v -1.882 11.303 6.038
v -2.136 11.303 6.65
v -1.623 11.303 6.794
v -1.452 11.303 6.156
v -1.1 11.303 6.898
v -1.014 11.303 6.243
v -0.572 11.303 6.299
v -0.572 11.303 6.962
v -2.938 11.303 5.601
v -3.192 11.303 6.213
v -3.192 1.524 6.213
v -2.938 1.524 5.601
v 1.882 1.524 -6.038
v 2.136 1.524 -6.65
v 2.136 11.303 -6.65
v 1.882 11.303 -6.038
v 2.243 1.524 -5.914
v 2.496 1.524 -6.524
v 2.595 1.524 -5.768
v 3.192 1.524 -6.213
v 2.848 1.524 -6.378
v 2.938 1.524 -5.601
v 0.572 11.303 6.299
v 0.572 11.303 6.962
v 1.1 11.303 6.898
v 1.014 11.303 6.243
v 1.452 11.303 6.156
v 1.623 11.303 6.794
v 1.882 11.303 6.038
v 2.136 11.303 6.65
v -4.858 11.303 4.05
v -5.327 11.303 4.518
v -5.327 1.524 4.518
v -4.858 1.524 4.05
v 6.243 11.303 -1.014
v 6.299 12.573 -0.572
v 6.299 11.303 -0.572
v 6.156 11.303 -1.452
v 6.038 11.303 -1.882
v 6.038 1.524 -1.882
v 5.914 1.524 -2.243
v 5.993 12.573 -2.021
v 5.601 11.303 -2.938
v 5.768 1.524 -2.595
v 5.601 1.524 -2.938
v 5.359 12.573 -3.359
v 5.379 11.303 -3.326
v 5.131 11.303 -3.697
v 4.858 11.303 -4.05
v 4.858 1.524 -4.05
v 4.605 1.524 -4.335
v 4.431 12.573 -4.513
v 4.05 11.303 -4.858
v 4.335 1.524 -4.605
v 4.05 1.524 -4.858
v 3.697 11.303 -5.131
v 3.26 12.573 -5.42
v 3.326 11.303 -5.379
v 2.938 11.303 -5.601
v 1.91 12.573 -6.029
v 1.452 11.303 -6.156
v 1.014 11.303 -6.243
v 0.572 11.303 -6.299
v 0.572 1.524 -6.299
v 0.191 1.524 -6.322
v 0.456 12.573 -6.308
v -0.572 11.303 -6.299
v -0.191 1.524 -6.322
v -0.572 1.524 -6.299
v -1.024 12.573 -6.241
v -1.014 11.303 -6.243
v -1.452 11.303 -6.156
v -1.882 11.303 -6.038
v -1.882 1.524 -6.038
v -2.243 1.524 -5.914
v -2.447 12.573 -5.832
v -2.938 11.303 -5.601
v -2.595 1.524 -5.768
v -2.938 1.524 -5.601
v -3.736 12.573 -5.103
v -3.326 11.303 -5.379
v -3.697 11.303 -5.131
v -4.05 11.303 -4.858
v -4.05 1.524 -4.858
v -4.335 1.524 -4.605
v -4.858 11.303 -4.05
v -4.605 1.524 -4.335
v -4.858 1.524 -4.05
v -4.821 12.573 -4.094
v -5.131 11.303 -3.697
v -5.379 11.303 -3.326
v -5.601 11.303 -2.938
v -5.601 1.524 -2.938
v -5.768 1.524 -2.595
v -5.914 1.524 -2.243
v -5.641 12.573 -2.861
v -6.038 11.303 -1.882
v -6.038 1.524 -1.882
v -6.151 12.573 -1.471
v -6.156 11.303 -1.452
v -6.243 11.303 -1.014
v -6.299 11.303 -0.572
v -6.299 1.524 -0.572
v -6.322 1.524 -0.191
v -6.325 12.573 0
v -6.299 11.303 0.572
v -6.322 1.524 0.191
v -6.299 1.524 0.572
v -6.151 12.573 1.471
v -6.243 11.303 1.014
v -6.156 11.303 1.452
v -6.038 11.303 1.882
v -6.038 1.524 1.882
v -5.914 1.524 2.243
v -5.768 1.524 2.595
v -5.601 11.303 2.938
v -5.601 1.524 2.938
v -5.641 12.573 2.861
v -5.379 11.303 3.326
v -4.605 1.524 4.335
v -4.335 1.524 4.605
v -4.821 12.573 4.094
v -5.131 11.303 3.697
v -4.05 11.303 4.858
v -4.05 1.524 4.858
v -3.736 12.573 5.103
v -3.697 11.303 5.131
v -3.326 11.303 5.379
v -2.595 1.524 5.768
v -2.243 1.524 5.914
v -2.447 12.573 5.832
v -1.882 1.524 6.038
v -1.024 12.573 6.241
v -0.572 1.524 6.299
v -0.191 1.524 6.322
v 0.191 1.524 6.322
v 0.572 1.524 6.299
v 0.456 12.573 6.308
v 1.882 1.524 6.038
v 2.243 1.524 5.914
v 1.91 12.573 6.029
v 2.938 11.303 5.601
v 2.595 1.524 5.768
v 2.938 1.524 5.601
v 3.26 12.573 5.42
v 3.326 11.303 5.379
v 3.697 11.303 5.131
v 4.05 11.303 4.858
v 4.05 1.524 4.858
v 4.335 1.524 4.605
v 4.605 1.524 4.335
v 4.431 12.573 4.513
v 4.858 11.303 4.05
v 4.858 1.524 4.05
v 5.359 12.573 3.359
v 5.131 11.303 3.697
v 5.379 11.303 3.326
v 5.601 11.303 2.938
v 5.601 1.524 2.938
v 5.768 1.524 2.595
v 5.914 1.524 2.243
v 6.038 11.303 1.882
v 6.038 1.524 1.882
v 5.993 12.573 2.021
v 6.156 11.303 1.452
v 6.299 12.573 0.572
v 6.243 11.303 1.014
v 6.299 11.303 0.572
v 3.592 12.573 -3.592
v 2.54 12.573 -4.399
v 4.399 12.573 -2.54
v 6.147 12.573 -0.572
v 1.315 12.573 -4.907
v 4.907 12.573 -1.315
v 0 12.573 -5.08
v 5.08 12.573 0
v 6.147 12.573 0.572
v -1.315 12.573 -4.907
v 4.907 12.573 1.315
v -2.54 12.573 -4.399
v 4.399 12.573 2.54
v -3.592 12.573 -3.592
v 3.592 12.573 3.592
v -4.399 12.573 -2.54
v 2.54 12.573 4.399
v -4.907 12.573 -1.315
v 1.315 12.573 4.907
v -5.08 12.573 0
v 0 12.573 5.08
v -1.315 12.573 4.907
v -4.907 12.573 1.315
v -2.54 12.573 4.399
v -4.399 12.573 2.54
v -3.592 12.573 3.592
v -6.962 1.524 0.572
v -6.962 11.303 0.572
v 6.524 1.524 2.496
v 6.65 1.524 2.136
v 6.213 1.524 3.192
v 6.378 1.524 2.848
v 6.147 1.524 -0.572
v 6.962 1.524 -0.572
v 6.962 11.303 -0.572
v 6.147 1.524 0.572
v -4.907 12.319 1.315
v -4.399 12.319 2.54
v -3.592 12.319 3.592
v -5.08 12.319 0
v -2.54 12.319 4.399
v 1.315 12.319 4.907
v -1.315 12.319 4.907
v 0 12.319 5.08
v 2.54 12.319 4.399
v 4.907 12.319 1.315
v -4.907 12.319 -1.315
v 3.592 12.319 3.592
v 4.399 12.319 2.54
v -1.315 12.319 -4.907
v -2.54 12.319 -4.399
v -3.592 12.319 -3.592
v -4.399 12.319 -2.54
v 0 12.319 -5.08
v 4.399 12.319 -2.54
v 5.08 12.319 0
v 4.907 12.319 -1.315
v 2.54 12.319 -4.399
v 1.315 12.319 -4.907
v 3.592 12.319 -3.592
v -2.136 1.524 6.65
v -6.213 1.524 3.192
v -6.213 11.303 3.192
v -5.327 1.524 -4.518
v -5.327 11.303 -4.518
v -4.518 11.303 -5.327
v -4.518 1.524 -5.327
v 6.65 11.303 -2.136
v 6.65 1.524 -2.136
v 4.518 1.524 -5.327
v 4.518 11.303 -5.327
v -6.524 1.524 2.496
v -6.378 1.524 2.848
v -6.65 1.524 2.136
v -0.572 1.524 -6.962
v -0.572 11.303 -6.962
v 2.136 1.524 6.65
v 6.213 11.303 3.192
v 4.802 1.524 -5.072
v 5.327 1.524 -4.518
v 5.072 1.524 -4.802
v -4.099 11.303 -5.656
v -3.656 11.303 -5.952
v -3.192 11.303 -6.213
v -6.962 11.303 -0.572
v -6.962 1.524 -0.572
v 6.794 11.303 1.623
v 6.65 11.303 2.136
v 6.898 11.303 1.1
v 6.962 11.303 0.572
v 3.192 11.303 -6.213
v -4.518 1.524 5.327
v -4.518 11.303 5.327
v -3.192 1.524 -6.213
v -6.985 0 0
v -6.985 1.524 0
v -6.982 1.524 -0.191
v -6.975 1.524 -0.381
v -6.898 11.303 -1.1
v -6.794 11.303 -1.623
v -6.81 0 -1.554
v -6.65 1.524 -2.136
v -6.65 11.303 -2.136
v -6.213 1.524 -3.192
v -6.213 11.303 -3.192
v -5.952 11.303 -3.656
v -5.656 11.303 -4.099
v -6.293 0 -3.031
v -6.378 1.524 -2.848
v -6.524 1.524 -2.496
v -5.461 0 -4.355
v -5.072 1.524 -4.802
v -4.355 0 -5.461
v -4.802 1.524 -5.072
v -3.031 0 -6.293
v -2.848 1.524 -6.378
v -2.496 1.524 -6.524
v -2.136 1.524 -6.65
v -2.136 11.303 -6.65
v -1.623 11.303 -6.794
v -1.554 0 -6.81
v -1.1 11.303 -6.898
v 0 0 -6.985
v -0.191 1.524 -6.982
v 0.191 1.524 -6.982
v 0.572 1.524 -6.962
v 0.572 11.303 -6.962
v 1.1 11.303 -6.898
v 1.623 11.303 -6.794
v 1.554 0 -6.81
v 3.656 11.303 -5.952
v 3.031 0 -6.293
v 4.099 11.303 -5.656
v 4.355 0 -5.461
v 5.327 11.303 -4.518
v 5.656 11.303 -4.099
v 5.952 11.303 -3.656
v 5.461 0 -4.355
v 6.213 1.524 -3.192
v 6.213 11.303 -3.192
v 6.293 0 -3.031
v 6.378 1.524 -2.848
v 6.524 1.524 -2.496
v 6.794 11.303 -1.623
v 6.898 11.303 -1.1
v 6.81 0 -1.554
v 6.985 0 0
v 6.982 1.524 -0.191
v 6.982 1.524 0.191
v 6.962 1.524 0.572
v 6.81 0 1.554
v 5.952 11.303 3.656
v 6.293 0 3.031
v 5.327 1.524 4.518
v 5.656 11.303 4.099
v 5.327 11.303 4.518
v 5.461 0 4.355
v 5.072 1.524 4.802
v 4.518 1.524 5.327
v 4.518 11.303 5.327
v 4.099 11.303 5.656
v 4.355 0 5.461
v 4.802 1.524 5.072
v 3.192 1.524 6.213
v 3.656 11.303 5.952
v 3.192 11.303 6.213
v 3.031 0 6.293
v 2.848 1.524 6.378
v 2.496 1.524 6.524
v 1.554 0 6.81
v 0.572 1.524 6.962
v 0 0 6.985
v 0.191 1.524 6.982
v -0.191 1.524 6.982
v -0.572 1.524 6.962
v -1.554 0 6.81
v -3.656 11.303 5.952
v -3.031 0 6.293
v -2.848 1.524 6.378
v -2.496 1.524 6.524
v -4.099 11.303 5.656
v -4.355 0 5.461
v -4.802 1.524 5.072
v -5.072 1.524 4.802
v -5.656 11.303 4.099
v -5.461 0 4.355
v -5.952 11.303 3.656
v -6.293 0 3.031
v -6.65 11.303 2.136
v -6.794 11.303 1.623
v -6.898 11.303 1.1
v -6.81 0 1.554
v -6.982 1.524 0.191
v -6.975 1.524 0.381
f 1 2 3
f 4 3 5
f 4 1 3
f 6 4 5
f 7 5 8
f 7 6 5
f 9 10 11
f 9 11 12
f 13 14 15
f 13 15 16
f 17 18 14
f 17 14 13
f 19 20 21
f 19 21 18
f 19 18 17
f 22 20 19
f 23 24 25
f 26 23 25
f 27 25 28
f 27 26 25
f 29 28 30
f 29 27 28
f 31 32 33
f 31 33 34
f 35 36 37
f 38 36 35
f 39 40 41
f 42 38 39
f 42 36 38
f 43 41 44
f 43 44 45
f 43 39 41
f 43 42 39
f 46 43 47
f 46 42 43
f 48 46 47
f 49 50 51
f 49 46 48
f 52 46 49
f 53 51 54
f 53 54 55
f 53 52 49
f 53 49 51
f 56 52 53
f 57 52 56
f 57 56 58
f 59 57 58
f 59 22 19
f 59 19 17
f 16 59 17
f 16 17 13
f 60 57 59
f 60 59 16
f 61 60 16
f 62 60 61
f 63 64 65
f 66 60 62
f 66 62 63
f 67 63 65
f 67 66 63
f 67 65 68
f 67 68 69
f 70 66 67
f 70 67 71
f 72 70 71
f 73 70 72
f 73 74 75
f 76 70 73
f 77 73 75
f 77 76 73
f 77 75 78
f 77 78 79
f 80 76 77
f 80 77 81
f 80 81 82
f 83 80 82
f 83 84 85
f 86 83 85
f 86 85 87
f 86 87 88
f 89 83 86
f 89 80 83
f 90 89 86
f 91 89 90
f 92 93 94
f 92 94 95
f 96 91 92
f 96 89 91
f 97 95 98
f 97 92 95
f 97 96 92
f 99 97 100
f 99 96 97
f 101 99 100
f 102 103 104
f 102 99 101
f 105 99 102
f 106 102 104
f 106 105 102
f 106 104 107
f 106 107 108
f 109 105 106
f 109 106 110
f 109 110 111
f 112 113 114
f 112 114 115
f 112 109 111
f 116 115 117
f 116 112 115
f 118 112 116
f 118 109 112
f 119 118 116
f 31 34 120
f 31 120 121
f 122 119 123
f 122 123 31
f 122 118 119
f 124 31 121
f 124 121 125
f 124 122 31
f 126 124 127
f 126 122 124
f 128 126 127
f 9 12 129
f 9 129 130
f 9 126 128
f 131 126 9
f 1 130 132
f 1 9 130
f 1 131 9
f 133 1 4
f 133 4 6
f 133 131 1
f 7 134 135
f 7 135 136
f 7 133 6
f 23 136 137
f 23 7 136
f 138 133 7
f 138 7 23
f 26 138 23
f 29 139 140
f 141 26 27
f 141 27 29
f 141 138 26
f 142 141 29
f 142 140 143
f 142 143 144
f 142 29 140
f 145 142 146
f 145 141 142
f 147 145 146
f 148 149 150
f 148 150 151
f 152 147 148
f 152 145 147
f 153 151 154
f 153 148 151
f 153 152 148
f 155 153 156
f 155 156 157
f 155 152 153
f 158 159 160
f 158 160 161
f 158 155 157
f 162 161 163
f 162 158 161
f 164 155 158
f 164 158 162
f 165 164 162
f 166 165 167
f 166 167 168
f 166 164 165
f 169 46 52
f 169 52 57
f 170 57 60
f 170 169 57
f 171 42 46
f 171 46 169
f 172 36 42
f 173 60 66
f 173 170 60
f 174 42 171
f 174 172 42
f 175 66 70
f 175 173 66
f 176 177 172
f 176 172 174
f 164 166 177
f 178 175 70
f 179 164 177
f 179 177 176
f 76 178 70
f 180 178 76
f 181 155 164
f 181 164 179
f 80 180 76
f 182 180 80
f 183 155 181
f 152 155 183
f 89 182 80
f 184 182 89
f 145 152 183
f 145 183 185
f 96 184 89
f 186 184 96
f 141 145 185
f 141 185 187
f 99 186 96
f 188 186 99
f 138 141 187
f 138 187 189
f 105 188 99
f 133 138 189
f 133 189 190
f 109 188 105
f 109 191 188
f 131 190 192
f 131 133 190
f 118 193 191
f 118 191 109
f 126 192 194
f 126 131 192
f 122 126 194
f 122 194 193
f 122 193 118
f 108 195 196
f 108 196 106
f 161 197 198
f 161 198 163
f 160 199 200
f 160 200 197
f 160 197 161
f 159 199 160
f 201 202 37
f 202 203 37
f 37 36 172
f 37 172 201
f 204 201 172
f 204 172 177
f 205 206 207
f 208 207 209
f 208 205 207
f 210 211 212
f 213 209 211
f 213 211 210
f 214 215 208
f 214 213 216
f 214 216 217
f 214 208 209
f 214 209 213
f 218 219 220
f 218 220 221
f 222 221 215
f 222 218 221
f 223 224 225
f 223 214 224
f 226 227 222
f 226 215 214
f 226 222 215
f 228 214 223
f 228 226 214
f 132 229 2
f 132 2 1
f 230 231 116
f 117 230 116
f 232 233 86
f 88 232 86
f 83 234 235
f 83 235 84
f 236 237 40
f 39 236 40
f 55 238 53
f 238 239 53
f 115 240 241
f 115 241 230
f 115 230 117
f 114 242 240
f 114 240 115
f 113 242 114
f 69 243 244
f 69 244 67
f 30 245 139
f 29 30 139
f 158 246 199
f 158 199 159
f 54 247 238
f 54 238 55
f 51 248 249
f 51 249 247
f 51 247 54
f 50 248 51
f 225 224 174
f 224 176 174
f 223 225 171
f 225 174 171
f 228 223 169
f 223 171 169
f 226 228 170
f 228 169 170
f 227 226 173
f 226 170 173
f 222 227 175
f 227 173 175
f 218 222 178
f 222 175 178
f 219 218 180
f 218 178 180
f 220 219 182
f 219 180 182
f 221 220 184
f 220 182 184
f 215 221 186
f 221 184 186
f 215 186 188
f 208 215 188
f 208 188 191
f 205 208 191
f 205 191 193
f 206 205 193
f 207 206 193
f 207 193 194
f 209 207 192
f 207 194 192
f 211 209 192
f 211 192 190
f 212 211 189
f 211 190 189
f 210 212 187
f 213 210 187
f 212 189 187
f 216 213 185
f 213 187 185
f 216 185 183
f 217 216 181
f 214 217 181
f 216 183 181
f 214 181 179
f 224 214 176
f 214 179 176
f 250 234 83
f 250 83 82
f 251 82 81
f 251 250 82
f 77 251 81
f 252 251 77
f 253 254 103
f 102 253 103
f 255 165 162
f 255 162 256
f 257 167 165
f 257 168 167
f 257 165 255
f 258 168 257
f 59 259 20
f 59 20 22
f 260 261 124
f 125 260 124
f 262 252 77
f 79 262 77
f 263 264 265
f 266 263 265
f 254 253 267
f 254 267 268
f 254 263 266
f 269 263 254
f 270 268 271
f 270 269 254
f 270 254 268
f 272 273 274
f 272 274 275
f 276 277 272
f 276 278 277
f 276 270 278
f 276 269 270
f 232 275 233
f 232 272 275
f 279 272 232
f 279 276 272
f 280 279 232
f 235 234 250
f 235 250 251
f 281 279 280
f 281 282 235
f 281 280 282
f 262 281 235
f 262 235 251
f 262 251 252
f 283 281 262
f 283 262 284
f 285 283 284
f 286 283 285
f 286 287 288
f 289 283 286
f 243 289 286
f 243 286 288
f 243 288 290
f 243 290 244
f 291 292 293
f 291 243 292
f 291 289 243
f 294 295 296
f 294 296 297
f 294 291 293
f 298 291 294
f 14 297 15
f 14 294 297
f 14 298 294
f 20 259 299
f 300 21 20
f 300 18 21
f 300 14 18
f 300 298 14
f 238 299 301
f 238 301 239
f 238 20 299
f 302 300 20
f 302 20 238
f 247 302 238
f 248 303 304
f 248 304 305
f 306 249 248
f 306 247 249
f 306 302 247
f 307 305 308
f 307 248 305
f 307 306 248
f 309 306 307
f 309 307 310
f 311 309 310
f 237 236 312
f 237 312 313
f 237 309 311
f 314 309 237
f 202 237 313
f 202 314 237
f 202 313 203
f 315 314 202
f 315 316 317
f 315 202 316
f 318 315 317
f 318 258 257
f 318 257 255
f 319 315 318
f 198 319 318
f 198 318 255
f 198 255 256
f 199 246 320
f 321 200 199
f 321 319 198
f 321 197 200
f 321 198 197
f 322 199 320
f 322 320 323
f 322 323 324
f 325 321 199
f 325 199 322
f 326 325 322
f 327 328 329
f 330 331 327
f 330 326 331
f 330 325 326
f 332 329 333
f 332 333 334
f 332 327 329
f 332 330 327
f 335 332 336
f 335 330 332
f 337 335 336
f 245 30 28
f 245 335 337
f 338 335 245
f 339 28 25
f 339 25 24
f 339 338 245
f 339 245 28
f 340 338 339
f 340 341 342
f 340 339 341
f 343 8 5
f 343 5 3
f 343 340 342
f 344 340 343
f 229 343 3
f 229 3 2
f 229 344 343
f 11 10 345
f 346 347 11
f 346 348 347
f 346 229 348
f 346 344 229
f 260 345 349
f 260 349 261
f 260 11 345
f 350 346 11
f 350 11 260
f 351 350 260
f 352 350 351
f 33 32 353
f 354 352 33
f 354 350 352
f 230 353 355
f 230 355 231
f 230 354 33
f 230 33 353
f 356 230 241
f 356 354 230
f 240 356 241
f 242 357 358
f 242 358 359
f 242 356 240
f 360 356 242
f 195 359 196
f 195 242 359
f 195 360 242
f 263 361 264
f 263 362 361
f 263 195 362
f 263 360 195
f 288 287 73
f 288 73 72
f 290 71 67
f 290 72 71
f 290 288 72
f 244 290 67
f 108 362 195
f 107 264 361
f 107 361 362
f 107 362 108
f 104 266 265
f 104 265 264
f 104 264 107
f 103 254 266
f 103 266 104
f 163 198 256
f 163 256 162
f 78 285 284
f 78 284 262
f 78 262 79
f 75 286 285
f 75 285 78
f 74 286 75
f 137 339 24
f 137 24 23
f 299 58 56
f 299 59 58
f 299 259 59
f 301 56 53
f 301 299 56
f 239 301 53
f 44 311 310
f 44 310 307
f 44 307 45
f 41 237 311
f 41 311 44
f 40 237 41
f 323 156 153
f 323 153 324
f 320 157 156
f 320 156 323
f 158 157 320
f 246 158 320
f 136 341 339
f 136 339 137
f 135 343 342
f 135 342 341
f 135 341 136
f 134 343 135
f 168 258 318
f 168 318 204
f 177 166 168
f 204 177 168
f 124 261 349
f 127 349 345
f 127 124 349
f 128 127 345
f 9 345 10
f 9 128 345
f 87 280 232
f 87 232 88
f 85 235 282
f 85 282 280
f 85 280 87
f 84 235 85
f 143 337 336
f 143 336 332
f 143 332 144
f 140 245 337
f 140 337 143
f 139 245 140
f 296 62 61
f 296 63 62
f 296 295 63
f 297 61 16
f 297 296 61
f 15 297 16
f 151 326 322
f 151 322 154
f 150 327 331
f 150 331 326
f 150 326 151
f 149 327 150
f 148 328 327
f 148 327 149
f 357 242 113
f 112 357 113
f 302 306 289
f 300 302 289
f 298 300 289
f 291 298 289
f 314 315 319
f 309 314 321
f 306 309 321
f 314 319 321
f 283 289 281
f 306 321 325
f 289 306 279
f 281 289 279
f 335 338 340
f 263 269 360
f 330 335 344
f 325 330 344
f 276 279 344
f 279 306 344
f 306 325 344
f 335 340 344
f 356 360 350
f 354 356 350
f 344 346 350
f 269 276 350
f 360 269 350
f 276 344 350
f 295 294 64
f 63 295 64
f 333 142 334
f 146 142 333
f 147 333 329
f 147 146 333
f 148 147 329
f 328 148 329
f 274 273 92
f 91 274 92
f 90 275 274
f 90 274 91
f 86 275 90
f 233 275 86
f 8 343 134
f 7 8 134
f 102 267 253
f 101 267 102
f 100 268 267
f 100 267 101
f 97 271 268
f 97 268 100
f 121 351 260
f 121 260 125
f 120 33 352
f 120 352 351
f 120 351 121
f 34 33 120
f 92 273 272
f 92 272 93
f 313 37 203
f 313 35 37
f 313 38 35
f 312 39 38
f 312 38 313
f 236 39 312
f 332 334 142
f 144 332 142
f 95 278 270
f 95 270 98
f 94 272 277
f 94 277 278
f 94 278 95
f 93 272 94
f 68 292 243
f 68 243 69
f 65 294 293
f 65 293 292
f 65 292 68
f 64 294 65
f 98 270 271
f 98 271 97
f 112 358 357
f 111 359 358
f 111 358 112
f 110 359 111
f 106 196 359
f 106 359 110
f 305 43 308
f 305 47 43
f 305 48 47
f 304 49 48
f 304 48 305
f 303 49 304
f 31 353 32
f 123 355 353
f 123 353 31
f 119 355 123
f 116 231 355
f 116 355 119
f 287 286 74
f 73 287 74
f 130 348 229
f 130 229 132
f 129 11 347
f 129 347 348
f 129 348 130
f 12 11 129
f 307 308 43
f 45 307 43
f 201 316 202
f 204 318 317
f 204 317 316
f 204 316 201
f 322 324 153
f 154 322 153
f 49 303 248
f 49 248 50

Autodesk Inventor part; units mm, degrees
ref_plane "YZ Plane" through (0, 0, 0) normal (1, 0, 0) x (0, 1, 0)
ref_plane "XZ Plane" through (0, 0, 0) normal (0, 1, 0) x (-1, 0, 0)
ref_plane "XY Plane" through (0, 0, 0) normal (0, 0, 1) x (1, 0, 0)
sketch "Sketch1" plane through (0, 0, 0) normal (0, 1, 0) x (-1, 0, 0)
  circle A0 centre (0, 0) radius 6.985
  dimension "d0" = 13.97
extrude "Extrusion1" add sketch "Sketch1" along normal blind 12.573
sketch "Sketch2" plane through (0, 12.573, 0) normal (0, 1, 0) x (1, 0, 0)
  circle A0 centre (0, 0) radius 6.3246
  circle A1 centre (0, 0) radius 6.985 projected
  dimension "d3" = 12.6492
extrude "Extrusion2" cut sketch "Sketch2" against normal blind 1.27
sketch "Sketch3" plane through (0, 11.303, 0) normal (0, 1, 0) x (1, 0, 0)
  circle A0 centre (0, 0) radius 6.3246 projected
  circle A1 centre (0, 0) radius 6.985 projected
  circle A2 centre (0, 0) radius 6.985 projected
  line L0 (-6.9616, -0.5715) -> (-6.2987, -0.5715)
  line L1 (-6.9616, 0.5715) -> (-6.2987, 0.5715)
  dimension "d6" = 1.143
  dimension "d7" = 0.5715
extrude "Extrusion3" cut sketch "Sketch3" against normal blind 9.779 contours A0 L0 A1 L1 picked at (-6.5273, 0.4446)
pattern_circular "Circular Pattern1" count 16 over 360 about axis through (0, 0, 0) along (0, 1, 0) of "Extrusion3"
sketch "Sketch4" plane through (0, 12.573, 0) normal (0, 1, 0) x (1, 0, 0)
  circle A0 centre (0, 0) radius 5.08
  dimension "d13" = 10.16
extrude "Extrusion4" cut sketch "Sketch4" against normal blind 0.254
sketch "Sketch5" plane through (0, 12.573, 0) normal (0, 1, 0) x (1, 0, 0)
  line L0 (6.2987, 0.5715) -> (6.9616, 0.5715) projected
  line L1 (6.9616, -0.5715) -> (6.2987, -0.5715) projected
  circle A0 centre (0, 0) radius 6.3246 projected
  line L2 (6.2987, 0.5715) -> (6.1474, 0.5715)
  line L3 (6.1474, 0.5715) -> (6.1474, -0.5715)
  line L4 (6.1474, -0.5715) -> (6.2987, -0.5715)
extrude "Extrusion5" cut sketch "Sketch5" against normal blind 11.049 contours A0 L4 L3 L2 picked at (6.2065, 0)
equation "\"d7\" = 0.5 * d6"
properties part number "Knob3"
